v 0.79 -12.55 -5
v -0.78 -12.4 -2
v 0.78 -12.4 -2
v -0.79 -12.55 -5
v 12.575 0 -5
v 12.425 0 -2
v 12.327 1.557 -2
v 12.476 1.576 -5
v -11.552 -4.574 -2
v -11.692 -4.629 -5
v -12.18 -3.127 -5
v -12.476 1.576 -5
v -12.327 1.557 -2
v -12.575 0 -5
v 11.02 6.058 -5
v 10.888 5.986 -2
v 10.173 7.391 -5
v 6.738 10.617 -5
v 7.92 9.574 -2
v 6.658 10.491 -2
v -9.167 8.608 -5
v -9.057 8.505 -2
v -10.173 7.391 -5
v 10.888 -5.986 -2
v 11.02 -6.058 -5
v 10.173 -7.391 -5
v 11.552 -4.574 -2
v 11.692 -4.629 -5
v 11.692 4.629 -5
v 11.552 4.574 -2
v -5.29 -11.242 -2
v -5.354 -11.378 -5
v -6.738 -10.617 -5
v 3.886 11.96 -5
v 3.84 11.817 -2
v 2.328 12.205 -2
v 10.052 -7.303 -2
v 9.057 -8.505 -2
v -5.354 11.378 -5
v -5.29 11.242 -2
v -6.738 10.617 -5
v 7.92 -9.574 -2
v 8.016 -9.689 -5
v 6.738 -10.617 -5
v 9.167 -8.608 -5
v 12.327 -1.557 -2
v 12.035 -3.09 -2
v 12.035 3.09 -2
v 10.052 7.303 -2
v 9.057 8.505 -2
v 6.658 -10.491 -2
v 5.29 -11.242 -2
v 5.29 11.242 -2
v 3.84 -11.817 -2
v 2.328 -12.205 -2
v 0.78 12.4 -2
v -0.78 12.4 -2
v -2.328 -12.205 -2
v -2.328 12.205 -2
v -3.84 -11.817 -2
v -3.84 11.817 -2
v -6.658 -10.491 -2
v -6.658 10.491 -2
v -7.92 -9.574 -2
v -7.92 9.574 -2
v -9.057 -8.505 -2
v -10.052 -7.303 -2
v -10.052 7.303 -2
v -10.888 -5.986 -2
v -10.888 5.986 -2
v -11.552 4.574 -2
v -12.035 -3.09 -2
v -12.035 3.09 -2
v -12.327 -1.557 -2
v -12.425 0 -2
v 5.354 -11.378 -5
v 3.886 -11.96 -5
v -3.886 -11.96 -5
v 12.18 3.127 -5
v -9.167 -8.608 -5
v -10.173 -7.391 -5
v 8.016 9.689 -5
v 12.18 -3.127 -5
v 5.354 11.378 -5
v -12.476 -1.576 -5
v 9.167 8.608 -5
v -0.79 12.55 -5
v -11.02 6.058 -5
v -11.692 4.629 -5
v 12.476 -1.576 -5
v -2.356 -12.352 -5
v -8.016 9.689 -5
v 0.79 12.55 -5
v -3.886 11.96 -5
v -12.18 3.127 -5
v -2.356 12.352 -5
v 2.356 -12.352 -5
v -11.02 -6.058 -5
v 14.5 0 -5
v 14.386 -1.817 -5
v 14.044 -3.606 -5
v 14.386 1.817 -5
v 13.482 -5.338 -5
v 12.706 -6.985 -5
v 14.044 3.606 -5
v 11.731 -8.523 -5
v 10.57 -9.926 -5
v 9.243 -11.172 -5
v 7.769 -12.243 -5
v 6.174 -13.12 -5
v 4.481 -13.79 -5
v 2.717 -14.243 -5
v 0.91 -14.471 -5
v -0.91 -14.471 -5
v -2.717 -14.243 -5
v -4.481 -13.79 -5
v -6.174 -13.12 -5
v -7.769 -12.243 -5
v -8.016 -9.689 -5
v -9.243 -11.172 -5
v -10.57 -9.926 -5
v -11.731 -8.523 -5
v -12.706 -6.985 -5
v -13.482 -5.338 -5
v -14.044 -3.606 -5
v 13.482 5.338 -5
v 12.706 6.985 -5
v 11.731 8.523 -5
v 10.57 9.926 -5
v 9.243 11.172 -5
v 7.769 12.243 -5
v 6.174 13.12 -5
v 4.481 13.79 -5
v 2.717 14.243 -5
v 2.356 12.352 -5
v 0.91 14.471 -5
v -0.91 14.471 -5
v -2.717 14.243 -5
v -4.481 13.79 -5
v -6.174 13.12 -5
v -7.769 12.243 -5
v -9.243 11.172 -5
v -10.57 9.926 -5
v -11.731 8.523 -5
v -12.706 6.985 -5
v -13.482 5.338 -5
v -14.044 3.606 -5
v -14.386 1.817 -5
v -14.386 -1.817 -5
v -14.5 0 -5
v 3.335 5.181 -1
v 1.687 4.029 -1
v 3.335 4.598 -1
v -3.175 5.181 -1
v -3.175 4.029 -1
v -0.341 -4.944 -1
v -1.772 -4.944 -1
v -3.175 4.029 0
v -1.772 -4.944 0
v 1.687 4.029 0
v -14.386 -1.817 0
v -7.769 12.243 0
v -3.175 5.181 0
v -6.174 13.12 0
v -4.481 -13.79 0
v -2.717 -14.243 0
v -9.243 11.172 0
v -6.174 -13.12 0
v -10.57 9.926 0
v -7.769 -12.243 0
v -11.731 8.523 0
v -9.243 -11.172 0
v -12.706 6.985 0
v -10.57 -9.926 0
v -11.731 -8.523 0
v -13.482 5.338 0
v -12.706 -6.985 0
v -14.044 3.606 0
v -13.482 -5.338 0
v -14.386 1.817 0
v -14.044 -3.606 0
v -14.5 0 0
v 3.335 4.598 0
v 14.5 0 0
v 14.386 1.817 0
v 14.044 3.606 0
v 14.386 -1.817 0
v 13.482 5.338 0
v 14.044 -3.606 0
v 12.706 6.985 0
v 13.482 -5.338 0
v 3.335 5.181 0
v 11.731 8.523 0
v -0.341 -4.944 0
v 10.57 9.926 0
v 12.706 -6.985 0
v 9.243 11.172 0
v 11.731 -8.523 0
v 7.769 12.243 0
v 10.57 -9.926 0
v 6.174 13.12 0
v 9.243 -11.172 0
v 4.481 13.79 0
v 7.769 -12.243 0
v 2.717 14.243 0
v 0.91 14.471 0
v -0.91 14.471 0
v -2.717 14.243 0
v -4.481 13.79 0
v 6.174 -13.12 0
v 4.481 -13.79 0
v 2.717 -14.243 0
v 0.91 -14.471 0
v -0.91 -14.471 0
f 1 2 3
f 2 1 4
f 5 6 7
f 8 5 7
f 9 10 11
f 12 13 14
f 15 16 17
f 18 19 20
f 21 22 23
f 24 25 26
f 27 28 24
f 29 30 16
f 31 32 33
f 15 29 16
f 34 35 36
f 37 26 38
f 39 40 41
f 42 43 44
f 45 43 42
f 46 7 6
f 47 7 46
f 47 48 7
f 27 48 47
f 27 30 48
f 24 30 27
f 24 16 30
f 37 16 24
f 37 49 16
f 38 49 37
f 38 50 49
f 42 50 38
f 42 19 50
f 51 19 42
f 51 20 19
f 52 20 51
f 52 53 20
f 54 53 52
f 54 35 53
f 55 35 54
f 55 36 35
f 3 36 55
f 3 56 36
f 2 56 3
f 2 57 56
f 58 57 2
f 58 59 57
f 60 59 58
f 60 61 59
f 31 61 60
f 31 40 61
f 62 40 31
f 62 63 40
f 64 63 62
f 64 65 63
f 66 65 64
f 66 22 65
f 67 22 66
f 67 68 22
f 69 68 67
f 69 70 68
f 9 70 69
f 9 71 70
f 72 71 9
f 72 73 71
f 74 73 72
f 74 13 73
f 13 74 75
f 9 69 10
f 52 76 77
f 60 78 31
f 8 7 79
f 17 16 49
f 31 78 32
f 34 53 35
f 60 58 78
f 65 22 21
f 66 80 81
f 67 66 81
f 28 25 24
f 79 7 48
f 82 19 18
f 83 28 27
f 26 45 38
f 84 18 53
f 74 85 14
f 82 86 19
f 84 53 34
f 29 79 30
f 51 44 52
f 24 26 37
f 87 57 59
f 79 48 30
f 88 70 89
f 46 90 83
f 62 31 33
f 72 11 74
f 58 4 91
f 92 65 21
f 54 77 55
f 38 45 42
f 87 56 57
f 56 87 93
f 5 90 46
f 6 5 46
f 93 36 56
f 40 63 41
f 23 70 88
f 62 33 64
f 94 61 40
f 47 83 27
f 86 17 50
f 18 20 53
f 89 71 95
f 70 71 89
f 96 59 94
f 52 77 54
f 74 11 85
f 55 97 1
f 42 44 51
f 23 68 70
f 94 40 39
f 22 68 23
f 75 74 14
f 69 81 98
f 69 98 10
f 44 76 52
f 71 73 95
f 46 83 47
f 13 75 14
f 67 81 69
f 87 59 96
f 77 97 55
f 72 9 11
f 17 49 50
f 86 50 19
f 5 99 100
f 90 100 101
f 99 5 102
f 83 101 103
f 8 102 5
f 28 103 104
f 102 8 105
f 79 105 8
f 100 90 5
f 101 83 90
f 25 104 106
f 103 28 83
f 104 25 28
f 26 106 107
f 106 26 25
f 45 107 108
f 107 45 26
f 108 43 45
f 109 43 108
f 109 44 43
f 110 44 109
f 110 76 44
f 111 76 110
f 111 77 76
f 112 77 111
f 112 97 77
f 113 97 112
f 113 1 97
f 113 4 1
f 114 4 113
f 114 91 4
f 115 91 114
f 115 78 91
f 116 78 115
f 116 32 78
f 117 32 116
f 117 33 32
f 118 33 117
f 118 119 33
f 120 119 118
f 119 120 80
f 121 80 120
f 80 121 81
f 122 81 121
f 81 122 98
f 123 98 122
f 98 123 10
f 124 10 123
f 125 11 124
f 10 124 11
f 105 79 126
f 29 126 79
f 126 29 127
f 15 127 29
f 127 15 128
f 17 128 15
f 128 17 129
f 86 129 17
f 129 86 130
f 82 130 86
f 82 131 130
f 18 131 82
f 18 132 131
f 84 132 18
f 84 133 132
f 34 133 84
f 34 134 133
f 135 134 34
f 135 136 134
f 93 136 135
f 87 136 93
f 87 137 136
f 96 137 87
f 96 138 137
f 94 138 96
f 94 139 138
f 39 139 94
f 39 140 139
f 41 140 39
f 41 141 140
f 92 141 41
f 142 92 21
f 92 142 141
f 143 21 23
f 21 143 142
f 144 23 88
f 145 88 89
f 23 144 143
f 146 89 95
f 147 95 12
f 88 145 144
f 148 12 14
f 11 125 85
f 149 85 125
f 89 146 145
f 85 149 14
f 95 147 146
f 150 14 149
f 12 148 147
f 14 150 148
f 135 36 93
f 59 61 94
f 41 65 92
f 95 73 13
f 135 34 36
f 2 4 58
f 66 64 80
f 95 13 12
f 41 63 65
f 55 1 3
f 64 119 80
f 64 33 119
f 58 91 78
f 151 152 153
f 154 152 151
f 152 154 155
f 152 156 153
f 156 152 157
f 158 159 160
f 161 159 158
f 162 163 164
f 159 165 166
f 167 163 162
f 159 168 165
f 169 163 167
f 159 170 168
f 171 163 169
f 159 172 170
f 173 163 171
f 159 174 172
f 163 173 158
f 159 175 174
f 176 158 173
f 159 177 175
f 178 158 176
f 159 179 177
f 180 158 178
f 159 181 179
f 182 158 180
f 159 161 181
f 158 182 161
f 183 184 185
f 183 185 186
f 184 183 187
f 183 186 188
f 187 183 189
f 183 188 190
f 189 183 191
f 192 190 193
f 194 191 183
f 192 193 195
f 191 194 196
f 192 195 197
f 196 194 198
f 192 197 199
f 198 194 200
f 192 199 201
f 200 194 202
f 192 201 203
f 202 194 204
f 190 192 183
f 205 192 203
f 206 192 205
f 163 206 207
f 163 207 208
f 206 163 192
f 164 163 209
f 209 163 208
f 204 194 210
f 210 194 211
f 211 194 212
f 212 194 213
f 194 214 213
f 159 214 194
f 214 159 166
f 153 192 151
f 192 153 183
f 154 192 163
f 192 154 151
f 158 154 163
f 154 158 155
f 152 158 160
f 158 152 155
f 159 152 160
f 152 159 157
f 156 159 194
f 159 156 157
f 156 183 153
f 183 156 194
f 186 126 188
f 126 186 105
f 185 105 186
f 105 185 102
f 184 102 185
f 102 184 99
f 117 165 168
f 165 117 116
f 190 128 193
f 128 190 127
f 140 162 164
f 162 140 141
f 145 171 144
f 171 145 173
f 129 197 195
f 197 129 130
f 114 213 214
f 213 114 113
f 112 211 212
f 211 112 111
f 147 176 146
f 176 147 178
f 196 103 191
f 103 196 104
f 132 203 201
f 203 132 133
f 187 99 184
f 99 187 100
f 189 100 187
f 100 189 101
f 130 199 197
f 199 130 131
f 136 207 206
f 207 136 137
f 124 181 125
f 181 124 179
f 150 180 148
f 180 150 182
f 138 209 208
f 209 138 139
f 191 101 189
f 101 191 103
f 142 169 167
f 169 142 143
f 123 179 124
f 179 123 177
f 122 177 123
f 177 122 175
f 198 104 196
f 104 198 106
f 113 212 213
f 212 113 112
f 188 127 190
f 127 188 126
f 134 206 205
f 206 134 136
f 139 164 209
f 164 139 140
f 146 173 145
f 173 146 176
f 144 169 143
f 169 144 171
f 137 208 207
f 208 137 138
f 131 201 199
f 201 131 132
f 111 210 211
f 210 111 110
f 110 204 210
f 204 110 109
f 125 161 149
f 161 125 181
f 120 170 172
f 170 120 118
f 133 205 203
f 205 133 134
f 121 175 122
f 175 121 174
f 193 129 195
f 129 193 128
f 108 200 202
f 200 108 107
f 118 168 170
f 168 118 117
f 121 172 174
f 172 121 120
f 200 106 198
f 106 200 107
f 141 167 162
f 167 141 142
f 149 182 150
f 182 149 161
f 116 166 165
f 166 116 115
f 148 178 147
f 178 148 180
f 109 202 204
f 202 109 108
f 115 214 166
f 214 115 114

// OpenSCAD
$fn = 50;


difference() {
	union() {
		translate(v = [0, 0, -5.0000000000]) {
			cylinder(h = 5, r = 14.5000000000);
		}
	}
	union() {
		#translate(v = [0, 0, -5.0000000000]) {
			cylinder(h = 3, r1 = 12.5750000000, r2 = 12.4250000000);
		}
		translate(v = [0, 0, -1]) {
			linear_extrude(height = 1) {
				text(font = "Impact", halign = "center", size = 10, text = "7", valign = "center");
			}
		}
	}
}
